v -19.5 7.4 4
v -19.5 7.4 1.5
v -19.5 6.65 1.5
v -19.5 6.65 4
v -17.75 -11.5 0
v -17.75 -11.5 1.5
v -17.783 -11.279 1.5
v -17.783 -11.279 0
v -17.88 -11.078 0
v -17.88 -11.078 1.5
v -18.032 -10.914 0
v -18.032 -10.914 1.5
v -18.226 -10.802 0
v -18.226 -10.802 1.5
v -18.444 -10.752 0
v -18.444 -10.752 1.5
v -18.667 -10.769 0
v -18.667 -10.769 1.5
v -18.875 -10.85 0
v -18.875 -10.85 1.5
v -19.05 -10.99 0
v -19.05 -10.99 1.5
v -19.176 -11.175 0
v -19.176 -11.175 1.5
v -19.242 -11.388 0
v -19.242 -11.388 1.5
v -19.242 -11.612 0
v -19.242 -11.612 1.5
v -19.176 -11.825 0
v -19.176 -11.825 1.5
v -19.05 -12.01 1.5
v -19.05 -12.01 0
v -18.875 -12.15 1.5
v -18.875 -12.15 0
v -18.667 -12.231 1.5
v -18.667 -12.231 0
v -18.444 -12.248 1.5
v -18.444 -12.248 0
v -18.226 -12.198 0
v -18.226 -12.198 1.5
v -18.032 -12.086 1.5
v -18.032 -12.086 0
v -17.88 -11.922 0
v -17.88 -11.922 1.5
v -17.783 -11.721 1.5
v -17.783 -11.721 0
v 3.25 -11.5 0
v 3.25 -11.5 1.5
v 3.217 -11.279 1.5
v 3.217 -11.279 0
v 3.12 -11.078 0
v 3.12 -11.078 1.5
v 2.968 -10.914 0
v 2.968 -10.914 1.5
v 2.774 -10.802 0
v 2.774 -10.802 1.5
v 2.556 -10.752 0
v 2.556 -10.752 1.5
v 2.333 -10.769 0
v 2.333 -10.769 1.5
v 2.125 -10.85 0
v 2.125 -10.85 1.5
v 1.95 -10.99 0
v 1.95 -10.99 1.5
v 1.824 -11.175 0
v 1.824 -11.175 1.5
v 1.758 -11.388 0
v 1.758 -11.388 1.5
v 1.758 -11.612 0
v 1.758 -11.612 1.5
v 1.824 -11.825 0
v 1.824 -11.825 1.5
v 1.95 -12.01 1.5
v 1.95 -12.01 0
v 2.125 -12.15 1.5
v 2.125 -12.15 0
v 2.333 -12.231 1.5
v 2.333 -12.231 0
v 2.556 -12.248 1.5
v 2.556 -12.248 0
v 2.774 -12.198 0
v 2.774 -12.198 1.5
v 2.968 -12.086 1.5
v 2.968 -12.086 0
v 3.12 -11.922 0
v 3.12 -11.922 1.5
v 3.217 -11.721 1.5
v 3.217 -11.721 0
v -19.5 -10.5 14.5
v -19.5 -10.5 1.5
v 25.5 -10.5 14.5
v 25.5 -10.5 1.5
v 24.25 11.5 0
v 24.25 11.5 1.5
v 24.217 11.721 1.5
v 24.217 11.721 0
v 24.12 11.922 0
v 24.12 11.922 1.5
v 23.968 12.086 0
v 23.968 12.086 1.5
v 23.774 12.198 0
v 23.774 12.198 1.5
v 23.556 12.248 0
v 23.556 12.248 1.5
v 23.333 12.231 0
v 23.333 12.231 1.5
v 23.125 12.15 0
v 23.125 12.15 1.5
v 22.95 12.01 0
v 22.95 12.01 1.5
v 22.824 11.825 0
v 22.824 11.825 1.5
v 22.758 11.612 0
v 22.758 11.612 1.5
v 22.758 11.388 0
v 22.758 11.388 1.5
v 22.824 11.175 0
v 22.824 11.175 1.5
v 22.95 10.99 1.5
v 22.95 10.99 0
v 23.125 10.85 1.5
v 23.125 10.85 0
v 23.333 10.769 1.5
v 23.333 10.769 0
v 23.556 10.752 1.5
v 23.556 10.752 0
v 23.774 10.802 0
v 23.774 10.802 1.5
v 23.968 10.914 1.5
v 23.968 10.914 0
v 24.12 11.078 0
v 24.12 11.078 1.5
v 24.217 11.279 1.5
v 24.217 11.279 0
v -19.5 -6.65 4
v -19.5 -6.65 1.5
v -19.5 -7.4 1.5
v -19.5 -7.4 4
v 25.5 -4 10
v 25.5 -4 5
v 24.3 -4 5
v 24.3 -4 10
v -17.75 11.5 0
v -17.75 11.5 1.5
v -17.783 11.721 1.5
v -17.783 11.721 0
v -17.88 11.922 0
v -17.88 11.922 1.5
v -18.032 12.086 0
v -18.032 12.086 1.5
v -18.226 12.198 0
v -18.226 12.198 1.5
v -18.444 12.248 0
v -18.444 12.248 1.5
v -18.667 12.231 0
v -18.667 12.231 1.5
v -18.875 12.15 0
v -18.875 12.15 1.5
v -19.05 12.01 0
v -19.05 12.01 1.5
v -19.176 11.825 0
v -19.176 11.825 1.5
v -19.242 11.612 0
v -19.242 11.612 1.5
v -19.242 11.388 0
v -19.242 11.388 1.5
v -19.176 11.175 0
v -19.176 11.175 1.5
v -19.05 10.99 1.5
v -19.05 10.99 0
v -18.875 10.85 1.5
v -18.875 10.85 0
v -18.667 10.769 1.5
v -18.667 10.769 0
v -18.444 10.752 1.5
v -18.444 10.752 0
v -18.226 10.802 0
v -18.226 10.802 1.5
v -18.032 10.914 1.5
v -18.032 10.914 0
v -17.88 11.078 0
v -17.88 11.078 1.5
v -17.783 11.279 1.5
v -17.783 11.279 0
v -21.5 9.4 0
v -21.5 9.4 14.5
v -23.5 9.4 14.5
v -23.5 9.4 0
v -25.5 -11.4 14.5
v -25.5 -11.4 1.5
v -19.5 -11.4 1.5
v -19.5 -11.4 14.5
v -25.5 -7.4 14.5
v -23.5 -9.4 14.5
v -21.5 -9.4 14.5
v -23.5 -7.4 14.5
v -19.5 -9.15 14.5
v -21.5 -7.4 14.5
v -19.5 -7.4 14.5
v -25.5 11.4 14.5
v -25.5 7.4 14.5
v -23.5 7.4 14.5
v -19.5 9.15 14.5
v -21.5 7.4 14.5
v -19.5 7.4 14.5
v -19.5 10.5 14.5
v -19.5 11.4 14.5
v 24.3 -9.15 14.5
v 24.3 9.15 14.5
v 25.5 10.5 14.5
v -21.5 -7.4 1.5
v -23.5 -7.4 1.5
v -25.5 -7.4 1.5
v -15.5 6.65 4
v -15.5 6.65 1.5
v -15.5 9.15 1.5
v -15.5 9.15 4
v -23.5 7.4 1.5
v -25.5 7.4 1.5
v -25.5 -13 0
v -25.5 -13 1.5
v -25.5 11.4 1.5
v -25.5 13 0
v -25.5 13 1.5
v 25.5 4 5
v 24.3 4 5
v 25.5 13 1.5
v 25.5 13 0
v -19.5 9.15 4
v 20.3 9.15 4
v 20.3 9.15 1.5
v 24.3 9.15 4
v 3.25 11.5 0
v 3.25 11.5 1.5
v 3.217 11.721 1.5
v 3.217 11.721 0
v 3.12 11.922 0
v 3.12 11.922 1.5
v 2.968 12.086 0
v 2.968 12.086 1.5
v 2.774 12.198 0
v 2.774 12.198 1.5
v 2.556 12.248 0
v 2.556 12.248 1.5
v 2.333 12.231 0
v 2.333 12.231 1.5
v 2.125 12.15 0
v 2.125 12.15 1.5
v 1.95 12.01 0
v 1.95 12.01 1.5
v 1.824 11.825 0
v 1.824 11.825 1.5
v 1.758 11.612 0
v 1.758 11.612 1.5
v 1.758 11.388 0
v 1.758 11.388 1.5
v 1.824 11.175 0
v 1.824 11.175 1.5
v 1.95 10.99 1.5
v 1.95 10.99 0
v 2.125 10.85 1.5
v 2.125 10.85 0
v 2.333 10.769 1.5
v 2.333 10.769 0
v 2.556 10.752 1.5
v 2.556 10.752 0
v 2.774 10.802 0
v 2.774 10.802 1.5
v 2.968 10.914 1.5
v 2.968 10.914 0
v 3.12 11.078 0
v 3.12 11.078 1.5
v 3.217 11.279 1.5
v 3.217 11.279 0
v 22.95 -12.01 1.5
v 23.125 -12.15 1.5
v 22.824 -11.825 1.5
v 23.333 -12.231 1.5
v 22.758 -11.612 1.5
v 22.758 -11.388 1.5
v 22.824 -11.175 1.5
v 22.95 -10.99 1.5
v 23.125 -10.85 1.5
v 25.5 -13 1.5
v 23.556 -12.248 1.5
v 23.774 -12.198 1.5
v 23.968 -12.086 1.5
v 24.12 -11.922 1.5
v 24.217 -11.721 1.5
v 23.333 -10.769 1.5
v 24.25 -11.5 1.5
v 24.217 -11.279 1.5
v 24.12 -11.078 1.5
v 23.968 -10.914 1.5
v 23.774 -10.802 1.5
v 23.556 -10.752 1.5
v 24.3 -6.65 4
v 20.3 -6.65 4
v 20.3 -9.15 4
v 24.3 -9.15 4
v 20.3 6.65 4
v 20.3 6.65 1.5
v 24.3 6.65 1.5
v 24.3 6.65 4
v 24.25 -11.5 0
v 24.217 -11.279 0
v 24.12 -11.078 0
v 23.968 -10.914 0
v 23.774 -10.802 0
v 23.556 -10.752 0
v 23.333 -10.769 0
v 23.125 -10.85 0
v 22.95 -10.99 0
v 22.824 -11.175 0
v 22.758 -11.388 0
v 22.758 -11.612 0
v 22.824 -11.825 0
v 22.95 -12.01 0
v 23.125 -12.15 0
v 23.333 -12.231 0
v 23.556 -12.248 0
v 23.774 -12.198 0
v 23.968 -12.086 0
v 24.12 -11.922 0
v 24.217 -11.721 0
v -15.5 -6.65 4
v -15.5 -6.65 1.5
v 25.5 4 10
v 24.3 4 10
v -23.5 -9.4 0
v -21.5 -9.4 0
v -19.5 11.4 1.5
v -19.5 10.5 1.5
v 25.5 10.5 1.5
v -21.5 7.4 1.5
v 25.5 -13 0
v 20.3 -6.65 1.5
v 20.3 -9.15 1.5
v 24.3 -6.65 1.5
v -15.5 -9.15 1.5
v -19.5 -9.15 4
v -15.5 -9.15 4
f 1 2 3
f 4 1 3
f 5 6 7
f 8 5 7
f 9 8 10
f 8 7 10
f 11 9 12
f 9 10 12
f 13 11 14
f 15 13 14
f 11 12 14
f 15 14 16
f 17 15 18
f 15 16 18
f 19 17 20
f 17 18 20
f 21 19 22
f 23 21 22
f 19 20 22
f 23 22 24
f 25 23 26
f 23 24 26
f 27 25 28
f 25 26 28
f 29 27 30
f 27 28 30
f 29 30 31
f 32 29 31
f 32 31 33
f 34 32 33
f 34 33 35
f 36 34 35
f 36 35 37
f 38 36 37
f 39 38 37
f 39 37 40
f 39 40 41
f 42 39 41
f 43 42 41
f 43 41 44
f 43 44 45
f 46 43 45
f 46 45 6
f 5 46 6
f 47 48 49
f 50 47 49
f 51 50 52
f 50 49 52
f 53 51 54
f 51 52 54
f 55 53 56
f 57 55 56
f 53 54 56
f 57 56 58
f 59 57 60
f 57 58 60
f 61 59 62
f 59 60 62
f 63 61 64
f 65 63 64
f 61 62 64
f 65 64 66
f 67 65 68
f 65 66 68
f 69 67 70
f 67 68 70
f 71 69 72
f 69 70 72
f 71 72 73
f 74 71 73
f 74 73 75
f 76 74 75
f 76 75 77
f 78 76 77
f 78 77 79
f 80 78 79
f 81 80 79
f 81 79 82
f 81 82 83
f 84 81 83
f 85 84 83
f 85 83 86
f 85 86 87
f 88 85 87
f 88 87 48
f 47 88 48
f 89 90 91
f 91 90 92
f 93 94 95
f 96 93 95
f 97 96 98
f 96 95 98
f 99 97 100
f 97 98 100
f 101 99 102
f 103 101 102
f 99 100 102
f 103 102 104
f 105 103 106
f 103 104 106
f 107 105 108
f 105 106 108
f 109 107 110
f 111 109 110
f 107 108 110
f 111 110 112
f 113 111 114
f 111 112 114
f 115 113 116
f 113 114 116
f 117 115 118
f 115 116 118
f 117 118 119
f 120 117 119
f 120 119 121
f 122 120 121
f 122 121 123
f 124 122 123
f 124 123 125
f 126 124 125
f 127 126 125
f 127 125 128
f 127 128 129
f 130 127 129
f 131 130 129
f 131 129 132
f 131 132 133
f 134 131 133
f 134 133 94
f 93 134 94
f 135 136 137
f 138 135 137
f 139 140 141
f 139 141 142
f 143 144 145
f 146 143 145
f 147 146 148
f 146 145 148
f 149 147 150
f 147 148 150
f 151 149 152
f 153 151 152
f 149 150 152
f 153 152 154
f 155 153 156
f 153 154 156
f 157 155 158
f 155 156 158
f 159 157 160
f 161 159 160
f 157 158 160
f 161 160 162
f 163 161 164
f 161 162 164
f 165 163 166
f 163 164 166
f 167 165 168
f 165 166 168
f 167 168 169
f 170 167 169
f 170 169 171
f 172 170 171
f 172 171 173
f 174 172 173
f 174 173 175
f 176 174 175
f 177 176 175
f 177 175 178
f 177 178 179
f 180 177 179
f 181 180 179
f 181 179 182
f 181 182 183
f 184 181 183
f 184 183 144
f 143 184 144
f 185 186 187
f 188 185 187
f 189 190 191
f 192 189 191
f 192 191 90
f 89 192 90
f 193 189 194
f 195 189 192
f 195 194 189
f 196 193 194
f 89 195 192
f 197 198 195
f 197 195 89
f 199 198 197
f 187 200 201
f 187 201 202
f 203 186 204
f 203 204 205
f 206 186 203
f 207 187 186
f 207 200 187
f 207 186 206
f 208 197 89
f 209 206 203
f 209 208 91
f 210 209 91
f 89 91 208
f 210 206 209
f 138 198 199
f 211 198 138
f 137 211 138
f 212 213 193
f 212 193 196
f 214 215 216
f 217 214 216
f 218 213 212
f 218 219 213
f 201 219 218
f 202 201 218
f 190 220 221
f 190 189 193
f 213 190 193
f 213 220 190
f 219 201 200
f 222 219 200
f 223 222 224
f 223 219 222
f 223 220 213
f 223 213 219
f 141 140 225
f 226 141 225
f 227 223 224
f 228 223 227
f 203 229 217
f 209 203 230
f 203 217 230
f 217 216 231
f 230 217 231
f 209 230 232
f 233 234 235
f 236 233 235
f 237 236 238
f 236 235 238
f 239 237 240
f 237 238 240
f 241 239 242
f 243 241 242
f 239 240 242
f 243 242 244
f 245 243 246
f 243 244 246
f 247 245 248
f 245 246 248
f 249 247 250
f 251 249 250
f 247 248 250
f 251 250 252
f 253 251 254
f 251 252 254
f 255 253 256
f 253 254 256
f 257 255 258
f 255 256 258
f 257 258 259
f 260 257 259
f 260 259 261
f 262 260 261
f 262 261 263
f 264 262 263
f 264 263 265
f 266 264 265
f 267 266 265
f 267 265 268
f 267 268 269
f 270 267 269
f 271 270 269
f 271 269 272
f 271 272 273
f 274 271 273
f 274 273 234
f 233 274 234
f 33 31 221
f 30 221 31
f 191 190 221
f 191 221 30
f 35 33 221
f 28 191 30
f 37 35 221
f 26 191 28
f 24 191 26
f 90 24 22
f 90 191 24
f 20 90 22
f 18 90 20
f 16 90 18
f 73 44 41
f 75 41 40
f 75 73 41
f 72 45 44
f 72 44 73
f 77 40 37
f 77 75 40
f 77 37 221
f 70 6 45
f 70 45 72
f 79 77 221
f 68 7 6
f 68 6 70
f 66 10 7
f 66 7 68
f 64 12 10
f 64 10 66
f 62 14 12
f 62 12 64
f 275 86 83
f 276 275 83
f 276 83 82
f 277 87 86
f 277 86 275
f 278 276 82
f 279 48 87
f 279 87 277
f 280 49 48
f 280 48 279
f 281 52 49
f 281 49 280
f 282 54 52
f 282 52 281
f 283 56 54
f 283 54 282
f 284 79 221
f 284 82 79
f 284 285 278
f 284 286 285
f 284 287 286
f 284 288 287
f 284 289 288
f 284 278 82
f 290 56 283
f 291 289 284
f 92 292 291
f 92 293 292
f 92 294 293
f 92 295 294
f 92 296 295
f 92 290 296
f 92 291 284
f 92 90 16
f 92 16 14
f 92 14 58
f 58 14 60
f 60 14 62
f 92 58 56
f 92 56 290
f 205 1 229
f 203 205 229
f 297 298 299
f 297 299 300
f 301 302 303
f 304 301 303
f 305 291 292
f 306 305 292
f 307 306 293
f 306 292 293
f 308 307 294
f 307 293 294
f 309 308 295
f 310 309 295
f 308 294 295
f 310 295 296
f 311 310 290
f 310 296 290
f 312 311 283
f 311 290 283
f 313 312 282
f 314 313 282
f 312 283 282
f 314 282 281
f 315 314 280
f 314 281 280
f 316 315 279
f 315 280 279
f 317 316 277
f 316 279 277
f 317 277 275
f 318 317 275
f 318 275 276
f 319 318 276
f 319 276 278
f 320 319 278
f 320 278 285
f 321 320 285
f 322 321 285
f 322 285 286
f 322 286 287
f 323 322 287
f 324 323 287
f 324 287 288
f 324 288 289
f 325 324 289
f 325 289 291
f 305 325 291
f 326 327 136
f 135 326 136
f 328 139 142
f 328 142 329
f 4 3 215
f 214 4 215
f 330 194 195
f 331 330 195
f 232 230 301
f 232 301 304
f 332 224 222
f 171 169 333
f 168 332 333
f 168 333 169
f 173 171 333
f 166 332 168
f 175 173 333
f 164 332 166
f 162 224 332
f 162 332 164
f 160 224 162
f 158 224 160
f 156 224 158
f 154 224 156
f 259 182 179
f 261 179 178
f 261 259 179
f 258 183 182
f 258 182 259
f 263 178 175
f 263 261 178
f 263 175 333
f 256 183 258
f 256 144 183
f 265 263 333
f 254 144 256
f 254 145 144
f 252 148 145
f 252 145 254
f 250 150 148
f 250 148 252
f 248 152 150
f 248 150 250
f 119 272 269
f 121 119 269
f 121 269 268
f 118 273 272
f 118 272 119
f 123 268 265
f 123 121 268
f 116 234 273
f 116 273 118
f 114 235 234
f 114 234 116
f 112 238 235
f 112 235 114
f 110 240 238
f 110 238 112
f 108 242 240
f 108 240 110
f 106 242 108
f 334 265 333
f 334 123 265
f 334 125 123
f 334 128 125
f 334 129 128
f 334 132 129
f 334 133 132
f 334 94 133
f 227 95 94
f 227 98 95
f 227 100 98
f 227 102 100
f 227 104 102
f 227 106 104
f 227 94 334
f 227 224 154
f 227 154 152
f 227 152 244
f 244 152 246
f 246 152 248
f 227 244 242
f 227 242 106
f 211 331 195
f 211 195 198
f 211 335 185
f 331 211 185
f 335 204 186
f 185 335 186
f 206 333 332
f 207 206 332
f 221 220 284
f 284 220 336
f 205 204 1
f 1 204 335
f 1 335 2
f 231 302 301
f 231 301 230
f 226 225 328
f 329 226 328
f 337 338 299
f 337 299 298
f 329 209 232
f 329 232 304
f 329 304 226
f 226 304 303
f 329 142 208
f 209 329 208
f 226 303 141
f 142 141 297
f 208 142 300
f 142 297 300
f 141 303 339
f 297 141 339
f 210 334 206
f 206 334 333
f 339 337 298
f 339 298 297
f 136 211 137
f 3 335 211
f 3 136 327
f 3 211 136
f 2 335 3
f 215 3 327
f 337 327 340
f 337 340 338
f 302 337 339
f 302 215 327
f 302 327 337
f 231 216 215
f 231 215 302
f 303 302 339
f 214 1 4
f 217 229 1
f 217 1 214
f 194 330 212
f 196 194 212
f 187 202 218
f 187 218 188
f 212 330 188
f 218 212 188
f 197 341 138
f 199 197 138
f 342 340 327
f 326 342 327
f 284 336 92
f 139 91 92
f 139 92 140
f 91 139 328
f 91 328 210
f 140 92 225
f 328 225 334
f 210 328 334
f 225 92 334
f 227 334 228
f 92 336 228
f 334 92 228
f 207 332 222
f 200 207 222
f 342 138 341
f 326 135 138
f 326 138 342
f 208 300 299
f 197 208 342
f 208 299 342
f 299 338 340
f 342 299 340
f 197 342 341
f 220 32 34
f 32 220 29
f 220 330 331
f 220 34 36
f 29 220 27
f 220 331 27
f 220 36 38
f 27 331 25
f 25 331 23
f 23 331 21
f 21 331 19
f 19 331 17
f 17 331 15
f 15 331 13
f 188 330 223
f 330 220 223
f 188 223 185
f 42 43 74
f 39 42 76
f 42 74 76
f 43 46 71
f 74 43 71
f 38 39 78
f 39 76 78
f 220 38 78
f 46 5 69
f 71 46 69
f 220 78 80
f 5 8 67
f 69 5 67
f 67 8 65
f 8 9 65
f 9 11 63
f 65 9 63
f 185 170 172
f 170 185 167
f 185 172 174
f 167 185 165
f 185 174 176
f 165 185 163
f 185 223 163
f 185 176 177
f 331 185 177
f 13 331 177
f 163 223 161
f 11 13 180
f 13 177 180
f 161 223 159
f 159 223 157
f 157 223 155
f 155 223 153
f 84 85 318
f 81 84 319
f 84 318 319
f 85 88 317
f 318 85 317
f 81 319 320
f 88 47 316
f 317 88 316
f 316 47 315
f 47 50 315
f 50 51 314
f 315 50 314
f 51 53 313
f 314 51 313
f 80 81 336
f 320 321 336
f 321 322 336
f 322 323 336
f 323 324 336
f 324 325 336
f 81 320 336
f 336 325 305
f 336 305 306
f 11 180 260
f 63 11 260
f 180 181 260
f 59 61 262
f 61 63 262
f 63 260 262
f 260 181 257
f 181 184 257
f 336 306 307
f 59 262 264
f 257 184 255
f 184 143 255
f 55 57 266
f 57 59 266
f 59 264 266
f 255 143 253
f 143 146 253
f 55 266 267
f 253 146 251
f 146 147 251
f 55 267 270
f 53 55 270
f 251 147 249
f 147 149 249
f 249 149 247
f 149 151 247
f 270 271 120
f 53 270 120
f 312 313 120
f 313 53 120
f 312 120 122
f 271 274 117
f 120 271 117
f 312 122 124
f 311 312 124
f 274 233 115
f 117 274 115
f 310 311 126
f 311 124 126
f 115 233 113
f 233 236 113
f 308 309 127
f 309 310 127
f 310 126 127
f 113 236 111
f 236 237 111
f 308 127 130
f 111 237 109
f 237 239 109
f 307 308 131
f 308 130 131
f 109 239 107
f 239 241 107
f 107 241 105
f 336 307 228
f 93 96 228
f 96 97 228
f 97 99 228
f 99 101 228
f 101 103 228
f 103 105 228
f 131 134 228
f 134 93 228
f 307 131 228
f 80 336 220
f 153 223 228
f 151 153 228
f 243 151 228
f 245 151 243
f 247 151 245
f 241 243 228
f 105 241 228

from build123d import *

# Parameters (mm, degrees)
F0_W      = 51
F0_H      = 26
F1_DEPTH  = 1.5
F2_W      = 2
F2_H      = 2
F3_DEPTH  = 13
F5_DEPTH  = 13
F6_W      = 4
F6_H      = 2.5
F7_DEPTH  = 2.5
F8_R      = 0.75
F9_DEPTH  = 1.501
F11_DEPTH = 2
F12_W     = 8
F12_H     = 5
F13_DEPTH = 1.2


with BuildPart() as f1:
    # F0 (on Top) → F1 (new body)
    with BuildSketch(Plane.XY):
        Rectangle(F0_W, F0_H)
    extrude(amount=F1_DEPTH)

    # F2 (on face) → F3 (join)
    with BuildSketch(Plane.XY.offset(1.5)):
        with Locations((-24.5, 8.4)):
            Rectangle(F2_W, F2_H)
        Polygon((-19.5, 11.4), (-25.5, 11.4), (-25.5, 9.4), (-23.5, 9.4), (-21.5, 9.4), (-19.5, 9.4), align=None)
        with Locations((-20.5, 8.4)):
            Rectangle(F2_W, F2_H)
        with Locations((-24.5, -8.4)):
            Rectangle(F2_W, F2_H)
        Polygon((-23.5, -9.4), (-25.5, -9.4), (-25.5, -11.4), (-19.5, -11.4), (-19.5, -9.4), (-21.5, -9.4), align=None)
        with Locations((-20.5, -8.4)):
            Rectangle(F2_W, F2_H)
    extrude(amount=F3_DEPTH)

    # F4 (on face) → F5 (join)
    with BuildSketch(Plane.XY.offset(1.5)):
        Polygon((-19.5, 10.5), (-19.5, 9.15), (24.3, 9.15), (24.3, -9.15), (-19.5, -9.15), (-19.5, -10.5), (25.5, -10.5), (25.5, 10.5), align=None)
    extrude(amount=F5_DEPTH)

    # F6 (on face) → F7 (join)
    with BuildSketch(Plane.XY.offset(1.5)):
        Polygon((-15.5, 9.15), (-19.5, 9.15), (-19.5, 7.4), (-19.5, 6.65), (-15.5, 6.65), align=None)
        with Locations((22.3, 7.9)):
            Rectangle(F6_W, F6_H)
        with Locations((22.3, -7.9)):
            Rectangle(F6_W, F6_H)
        Polygon((-19.5, -9.15), (-15.5, -9.15), (-15.5, -6.65), (-19.5, -6.65), (-19.5, -7.4), align=None)
    extrude(amount=F7_DEPTH)

    # F8 (on face) → F9 (cut, through all)
    with BuildSketch(Plane.XY.offset(1.5)):
        with Locations((-18.5, 11.5)):
            Circle(F8_R)
        with Locations((2.5, 11.5)):
            Circle(F8_R)
        with Locations((23.5, 11.5)):
            Circle(F8_R)
        with Locations((-18.5, -11.5)):
            Circle(F8_R)
        with Locations((2.5, -11.5)):
            Circle(F8_R)
        with Locations((23.5, -11.5)):
            Circle(F8_R)
    extrude(amount=-F9_DEPTH, mode=Mode.SUBTRACT)

    # F10 (on face) → F11 (cut)
    with BuildSketch(Plane.XY.offset(1.5)):
        Polygon((-21.5, 9.4), (-23.5, 9.4), (-23.5, 7.4), (-23.5, -7.4), (-23.5, -9.4), (-21.5, -9.4), (-21.5, -7.4), (-21.5, 7.4), align=None)
    extrude(amount=-F11_DEPTH, mode=Mode.SUBTRACT)

    # F12 (on face) → F13 (cut, through all)
    with BuildSketch(Plane.YZ.offset(25.5)):
        with Locations((0, 7.5)):
            Rectangle(F12_W, F12_H)
    extrude(amount=-F13_DEPTH, mode=Mode.SUBTRACT)


solid = f1.part
